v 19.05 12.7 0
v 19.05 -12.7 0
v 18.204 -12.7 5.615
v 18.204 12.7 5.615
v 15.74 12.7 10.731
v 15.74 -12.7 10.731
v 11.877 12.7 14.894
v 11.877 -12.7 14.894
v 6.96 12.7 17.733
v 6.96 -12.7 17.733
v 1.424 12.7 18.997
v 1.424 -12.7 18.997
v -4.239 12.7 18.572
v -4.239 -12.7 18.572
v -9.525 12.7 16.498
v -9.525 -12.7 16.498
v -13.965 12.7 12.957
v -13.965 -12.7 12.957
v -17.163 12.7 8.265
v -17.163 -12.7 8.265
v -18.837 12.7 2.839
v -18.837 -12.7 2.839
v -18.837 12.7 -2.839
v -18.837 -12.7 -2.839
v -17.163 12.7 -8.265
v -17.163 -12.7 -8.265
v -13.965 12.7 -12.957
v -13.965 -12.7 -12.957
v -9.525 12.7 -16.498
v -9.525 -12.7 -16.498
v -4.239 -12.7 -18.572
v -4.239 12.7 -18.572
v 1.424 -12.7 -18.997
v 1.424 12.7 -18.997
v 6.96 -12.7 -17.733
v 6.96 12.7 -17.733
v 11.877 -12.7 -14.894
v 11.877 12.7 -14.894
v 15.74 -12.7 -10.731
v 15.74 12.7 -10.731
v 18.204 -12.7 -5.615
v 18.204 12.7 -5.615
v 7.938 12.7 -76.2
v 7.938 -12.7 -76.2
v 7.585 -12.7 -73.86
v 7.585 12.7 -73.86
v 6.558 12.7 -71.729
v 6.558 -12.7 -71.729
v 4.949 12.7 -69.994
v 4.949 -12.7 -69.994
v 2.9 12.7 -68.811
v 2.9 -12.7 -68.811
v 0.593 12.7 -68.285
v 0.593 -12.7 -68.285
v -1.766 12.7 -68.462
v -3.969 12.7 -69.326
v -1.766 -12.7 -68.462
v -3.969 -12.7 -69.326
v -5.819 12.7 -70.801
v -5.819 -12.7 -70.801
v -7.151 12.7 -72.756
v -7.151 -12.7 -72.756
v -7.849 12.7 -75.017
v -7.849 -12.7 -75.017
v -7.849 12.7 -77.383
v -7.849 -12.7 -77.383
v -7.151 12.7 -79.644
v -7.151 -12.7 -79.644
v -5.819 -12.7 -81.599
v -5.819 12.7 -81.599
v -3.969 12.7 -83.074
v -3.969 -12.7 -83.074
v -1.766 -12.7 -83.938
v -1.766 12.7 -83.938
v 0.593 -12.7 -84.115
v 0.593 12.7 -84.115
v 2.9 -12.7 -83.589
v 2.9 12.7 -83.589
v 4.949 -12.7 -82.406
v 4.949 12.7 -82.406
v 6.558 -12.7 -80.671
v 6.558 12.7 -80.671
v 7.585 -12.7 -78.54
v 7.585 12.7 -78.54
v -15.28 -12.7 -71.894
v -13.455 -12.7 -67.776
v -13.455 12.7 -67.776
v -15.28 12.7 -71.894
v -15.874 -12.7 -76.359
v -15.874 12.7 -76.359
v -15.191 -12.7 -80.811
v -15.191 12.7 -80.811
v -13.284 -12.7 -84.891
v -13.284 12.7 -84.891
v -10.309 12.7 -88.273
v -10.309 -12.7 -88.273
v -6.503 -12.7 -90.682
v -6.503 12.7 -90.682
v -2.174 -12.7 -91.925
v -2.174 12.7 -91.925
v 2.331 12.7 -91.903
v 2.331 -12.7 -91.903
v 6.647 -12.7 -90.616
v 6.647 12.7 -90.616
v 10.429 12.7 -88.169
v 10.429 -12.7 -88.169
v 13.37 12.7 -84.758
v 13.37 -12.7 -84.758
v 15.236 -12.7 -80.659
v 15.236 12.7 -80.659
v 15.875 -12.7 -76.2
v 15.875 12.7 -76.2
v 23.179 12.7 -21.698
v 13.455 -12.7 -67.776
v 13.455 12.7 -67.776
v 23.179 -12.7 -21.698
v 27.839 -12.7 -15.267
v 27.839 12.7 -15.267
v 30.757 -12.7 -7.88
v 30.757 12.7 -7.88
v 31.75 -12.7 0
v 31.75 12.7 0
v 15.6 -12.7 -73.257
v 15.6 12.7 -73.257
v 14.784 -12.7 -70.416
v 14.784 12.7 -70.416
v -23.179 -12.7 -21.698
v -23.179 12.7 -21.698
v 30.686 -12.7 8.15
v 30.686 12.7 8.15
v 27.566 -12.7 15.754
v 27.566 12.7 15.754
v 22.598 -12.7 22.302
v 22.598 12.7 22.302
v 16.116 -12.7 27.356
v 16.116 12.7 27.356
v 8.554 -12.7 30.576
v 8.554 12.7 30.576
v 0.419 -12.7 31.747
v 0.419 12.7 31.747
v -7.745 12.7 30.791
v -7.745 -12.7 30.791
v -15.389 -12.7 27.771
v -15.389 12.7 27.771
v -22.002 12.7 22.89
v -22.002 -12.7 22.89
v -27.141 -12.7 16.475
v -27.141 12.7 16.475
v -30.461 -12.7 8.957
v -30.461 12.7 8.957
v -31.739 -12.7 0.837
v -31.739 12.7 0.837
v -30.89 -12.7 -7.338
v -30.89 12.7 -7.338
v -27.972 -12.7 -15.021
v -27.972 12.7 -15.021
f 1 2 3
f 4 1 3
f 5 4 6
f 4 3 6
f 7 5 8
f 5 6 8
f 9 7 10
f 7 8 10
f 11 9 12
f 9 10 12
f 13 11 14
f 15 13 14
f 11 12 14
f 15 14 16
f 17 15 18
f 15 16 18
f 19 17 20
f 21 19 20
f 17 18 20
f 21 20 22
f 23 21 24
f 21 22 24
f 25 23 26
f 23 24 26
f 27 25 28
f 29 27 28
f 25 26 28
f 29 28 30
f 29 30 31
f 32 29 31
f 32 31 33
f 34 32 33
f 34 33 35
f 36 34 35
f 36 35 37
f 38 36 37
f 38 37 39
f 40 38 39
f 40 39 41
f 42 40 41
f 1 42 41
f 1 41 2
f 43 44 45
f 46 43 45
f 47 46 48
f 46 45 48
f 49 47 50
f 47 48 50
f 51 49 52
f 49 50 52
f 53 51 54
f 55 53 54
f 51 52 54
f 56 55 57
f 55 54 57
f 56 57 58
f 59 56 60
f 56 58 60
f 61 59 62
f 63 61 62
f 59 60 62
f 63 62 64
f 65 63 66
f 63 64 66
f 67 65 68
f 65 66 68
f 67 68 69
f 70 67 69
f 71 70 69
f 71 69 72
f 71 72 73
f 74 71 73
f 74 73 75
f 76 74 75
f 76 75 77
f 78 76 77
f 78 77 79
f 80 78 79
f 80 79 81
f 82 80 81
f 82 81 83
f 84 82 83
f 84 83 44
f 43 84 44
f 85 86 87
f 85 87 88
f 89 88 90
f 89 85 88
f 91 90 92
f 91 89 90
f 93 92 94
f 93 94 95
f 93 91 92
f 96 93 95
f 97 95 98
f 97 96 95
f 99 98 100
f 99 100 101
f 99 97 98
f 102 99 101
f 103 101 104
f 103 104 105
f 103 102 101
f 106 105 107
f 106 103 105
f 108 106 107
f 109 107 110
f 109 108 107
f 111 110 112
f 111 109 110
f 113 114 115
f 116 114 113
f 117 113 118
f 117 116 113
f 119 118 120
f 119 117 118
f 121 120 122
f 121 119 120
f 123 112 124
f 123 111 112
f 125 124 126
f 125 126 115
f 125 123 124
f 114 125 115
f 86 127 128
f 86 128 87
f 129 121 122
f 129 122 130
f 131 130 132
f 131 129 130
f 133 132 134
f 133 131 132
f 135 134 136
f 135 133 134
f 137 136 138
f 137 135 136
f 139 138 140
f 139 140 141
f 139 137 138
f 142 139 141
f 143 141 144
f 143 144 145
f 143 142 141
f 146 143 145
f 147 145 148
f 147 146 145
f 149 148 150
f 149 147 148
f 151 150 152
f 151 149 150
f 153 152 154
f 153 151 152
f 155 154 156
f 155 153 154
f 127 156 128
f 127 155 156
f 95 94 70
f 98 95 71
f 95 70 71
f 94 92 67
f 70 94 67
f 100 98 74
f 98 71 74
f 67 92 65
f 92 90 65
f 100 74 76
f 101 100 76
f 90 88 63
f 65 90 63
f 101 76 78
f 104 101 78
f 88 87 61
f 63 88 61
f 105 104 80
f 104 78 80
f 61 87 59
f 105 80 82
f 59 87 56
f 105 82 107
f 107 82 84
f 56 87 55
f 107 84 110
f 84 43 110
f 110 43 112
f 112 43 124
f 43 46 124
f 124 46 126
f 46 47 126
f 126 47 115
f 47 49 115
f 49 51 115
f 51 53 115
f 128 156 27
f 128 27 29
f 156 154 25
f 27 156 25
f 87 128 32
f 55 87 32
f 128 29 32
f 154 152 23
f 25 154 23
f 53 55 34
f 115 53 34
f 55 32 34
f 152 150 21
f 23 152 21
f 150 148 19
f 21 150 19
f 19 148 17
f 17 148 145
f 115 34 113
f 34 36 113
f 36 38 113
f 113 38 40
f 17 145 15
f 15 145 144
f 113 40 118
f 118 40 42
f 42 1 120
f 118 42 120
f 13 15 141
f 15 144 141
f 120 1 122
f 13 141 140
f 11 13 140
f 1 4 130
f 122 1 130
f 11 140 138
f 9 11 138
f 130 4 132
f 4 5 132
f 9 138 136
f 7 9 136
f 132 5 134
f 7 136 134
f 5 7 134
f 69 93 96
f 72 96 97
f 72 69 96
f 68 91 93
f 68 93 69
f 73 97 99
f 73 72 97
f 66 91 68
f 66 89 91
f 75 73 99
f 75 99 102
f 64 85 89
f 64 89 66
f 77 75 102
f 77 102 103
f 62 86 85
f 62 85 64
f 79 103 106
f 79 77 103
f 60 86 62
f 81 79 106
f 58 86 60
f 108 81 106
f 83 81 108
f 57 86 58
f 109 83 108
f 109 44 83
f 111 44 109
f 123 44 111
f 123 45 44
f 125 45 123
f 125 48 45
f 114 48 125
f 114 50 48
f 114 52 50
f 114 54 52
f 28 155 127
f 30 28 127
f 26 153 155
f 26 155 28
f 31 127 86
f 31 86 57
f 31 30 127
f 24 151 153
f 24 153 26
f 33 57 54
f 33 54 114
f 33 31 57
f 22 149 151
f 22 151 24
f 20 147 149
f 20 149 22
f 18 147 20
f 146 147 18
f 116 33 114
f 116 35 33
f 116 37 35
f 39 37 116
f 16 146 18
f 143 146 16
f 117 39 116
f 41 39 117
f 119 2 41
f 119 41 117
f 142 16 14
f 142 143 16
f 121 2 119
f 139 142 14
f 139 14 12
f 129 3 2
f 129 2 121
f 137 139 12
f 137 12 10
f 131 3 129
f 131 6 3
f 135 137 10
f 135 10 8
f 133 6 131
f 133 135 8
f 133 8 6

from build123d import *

# Parameters (mm, degrees)
F1_DEPTH = 12.7
F2_DEPTH = 12.7
F3_R     = 19.05
F4_DEPTH = 25.401
F5_R     = 7.9375
F6_DEPTH = 25.401


with BuildPart() as f1:
    # F0 (on Front) → F1 (new body, symmetric)
    with BuildSketch(Plane.XZ):
        with BuildLine():
            ThreePointArc((23.178504, -21.698374), (29.529477, -11.665012), (31.75, 0))
            ThreePointArc((31.75, 0), (-11.665012, 29.529477), (-23.178504, -21.698374))
            ThreePointArc((-23.178504, -21.698374), (0, -31.75), (23.178504, -21.698374))
        make_face()
    extrude(amount=F1_DEPTH, both=True)

    # F0 (on Front) → F2 (join, symmetric)
    with BuildSketch(Plane.XZ):
        with BuildLine():
            ThreePointArc((23.178504, -21.698374), (0, -31.75), (-23.178504, -21.698374))
            Line((-23.178504, -21.698374), (-13.455255, -67.775527))
            ThreePointArc((-13.455255, -67.775527), (0, -60.325), (13.455255, -67.775527))
            Line((13.455255, -67.775527), (23.178504, -21.698374))
        make_face()
        with BuildLine():
            ThreePointArc((13.455255, -67.775527), (0, -60.325), (-13.455255, -67.775527))
            ThreePointArc((-13.455255, -67.775527), (-4.382548, -91.458077), (15.875, -76.2))
            ThreePointArc((15.875, -76.2), (15.258077, -71.817452), (13.455255, -67.775527))
        make_face()
    extrude(amount=F2_DEPTH, both=True)

    # F3 (on face) → F4 (cut, through all)
    with BuildSketch(Plane.XZ.offset(12.7)):
        Circle(F3_R)
    extrude(amount=-F4_DEPTH, mode=Mode.SUBTRACT)

    # F5 (on face) → F6 (cut, through all)
    with BuildSketch(Plane.XZ.offset(12.7)):
        with Locations((0, -76.2)):
            Circle(F5_R)
    extrude(amount=-F6_DEPTH, mode=Mode.SUBTRACT)


solid = f1.part
